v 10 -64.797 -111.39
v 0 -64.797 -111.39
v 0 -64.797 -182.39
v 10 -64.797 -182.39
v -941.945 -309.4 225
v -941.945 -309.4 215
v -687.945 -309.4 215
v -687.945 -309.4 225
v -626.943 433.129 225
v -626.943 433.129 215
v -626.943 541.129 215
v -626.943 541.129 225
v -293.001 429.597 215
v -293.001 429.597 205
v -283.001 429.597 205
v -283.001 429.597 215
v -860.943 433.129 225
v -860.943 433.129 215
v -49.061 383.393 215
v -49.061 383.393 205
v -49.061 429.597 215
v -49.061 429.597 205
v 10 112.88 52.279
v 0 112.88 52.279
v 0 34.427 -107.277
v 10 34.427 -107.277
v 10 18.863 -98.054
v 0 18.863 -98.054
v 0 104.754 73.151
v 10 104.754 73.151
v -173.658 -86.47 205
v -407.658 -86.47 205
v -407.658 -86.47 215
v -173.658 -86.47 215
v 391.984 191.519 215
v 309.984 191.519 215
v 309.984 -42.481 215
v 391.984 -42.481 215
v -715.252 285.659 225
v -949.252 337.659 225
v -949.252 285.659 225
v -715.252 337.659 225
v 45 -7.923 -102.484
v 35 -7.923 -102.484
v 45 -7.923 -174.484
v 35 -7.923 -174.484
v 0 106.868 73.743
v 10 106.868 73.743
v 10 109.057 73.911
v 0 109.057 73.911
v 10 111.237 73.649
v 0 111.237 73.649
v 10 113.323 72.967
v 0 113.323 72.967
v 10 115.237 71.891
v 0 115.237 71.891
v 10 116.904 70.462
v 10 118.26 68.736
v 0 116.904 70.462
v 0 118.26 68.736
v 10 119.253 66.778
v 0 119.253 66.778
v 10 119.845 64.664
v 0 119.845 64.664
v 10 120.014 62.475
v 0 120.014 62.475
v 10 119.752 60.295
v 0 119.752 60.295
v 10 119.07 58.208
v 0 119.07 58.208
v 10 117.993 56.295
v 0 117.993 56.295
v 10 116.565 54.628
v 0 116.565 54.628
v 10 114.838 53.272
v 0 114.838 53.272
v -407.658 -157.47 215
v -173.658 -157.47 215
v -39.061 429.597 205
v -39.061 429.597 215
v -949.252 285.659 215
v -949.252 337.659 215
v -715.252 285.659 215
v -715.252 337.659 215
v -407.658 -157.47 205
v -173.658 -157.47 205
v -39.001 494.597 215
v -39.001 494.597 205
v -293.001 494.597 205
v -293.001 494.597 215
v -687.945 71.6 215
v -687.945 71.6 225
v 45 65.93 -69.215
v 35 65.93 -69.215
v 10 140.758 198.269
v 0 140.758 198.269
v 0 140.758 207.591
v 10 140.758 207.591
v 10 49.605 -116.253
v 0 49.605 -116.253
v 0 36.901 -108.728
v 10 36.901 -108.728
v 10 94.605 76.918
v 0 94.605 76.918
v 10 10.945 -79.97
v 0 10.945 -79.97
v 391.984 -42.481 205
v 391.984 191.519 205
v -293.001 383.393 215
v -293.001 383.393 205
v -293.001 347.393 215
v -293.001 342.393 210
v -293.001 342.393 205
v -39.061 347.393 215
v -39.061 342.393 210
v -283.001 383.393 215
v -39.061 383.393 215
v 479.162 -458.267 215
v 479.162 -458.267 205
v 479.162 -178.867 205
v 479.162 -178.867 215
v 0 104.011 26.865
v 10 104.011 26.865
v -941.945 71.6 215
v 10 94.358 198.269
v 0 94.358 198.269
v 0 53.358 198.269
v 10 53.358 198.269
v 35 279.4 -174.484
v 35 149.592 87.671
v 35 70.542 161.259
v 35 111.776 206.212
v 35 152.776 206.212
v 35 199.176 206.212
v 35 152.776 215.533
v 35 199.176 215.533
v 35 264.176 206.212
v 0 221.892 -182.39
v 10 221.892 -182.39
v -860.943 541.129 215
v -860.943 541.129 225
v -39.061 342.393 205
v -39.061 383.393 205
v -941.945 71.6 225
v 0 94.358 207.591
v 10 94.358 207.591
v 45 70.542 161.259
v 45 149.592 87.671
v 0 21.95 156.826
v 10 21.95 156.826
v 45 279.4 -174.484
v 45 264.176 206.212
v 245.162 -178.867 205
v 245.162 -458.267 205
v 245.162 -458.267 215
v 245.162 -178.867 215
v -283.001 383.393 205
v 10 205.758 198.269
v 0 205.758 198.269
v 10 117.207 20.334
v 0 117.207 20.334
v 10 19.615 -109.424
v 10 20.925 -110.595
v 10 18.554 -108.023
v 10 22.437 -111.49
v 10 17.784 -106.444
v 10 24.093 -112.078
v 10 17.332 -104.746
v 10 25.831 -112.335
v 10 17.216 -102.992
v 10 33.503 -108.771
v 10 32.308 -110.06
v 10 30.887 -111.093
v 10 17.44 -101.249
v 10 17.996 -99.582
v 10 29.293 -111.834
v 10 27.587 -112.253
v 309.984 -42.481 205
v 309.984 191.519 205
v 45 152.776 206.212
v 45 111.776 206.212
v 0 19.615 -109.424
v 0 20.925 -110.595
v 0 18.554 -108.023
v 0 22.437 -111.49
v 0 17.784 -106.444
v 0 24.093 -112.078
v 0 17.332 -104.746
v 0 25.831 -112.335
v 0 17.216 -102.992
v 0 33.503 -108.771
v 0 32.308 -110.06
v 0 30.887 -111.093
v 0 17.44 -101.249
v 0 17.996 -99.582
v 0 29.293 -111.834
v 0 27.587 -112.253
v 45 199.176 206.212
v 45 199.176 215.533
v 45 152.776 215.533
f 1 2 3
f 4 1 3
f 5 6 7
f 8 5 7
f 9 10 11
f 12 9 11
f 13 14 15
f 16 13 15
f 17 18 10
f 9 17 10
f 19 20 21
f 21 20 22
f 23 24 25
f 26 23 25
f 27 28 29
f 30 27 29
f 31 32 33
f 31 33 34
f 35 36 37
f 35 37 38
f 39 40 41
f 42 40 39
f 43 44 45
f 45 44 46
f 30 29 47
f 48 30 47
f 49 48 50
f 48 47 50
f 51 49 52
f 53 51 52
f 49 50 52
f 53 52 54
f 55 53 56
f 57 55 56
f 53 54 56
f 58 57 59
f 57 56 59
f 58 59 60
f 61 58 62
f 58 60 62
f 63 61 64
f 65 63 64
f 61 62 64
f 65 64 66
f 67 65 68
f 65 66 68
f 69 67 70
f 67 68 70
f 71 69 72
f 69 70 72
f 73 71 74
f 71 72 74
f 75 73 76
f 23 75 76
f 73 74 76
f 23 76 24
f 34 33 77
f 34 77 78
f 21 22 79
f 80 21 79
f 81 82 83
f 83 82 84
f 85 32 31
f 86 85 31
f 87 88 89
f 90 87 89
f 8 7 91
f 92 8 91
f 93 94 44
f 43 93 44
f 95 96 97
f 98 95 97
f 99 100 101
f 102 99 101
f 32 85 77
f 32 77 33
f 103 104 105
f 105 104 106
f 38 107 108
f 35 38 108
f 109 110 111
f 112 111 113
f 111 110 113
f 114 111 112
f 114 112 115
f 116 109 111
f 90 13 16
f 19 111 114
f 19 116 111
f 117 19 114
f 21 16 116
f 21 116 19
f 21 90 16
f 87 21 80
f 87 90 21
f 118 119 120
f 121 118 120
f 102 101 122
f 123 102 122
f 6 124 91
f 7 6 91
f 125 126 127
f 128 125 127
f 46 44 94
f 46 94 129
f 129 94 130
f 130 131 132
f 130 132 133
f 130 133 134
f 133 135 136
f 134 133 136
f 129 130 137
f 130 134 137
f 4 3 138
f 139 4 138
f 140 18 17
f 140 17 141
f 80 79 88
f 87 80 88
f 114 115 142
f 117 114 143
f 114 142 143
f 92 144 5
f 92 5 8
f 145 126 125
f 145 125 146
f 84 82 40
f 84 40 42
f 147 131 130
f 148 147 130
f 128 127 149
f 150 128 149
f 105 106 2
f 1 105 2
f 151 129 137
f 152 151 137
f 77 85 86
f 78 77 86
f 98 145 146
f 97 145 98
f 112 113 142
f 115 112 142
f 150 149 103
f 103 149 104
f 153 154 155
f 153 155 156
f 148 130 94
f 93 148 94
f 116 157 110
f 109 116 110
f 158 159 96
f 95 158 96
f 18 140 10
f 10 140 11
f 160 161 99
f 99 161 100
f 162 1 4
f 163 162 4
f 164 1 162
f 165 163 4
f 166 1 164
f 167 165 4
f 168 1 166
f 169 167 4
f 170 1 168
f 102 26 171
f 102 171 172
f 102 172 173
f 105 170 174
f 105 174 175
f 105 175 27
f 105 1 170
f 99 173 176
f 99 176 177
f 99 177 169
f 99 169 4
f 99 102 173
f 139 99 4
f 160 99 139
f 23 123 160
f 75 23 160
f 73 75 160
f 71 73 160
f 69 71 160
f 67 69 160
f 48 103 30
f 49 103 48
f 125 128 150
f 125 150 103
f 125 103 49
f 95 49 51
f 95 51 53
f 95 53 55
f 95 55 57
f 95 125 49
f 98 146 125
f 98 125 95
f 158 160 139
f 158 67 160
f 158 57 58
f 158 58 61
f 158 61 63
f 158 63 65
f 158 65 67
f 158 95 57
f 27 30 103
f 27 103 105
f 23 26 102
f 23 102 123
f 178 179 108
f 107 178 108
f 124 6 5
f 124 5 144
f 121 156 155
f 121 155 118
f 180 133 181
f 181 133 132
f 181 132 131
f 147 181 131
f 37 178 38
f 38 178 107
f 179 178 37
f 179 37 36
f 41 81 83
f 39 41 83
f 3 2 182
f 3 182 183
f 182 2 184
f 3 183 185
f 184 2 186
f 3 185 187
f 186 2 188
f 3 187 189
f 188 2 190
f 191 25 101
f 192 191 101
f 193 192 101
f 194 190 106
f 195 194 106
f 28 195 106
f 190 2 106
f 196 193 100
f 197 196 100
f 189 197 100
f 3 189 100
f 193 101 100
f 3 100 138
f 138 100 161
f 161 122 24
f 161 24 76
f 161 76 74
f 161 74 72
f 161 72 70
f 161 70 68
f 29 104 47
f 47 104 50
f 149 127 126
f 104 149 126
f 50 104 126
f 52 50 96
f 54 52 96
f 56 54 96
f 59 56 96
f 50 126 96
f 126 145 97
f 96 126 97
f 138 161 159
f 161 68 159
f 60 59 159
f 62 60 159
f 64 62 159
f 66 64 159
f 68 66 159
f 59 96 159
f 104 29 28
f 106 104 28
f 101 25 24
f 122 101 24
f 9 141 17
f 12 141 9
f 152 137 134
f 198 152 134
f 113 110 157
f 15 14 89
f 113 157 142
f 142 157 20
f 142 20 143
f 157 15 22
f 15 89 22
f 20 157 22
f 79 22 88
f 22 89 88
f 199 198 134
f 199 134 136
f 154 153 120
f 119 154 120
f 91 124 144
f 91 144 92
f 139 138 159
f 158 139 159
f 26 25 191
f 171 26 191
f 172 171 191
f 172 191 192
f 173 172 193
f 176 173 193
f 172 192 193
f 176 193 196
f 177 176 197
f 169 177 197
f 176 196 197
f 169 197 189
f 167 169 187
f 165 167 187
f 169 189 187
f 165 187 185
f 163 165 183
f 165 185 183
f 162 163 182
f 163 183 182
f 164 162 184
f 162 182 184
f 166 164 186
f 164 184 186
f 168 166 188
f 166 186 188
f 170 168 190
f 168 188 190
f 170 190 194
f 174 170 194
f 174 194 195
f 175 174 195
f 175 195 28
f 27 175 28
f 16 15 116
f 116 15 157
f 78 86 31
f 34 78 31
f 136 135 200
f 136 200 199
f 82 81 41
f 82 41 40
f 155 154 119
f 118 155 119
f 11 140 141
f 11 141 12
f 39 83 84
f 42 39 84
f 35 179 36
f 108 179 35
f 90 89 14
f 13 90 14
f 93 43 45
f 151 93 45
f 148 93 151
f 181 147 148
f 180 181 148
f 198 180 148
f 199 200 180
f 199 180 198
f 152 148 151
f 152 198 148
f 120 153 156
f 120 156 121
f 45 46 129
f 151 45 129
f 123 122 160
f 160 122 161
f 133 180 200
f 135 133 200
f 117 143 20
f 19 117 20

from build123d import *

# Parameters (mm, degrees)
F0_W      = 46.4
F0_H      = 9.322
F1_DEPTH  = 10
F5_DEPTH  = 10
F7_SIZE   = 5
F9_W      = 46.4000000058
F9_H      = 9.3215752476
F10_DEPTH = 10
F11_W     = 254
F11_H     = 381
F12_DEPTH = 10
F13_W     = 234
F13_H     = 52
F14_DEPTH = 10
F15_W     = 234
F15_H     = 108
F16_DEPTH = 10
F17_W     = 82
F17_H     = 234
F18_DEPTH = 10
F19_W     = 234
F19_H     = 71
F20_DEPTH = 10
F21_W     = 234
F21_H     = 279.4
F22_DEPTH = 10


with BuildPart() as f1:
    # F0 (on Right) → F1 (new body)
    with BuildSketch(Plane.YZ):
        Polygon((-64.796539762, -182.3895969412), (-57.5082729275, -182.3895969412), (221.8917270725, -182.3895969412), (205.7584536639, 198.2686717056), (140.7584536639, 198.2686717056), (94.3584536639, 198.2686717056), (53.3584536639, 198.2686717056), (21.9498726075, 156.8259276359), (94.605094511, 76.9183639755), (10.9450170771, -79.9695942742), (-64.796539762, -111.3895969412), align=None)
        Polygon((49.6052874287, -116.2525428597), (36.9012057781, -108.7284162641), (104.0113260207, 26.8646163094), (117.2069395227, 20.3336081006), align=None, mode=Mode.SUBTRACT)
        with BuildLine():
            ThreePointArc((104.7540009022, 73.150858283), (119.2531366096, 66.7778584138), (112.8801367404, 52.2787227063))
            Line((112.8801367404, 52.2787227063), (34.4274975359, -107.2769835591))
            ThreePointArc((34.4274975359, -107.2769835591), (21.6595235328, -111.0791874475), (18.863433972, -98.0538353324))
            Line((18.863433972, -98.0538353324), (104.7540009022, 73.150858283))
        make_face(mode=Mode.SUBTRACT)
        with Locations((117.5584536639, 202.9296717056)):
            Rectangle(F0_W, F0_H)
    extrude(amount=F1_DEPTH)


with BuildPart() as f5:
    # F4 (on offset) → F5 (new body)
    with BuildSketch(Plane.XY.offset(205)):
        Polygon((-39.0006619062, 494.596632719), (-293.0006619062, 494.596632719), (-293.0006619062, 429.596632719), (-283.0006619062, 429.596632719), (-283.0006619062, 383.392881012), (-293.0006619062, 383.392881012), (-293.0006619062, 342.392881012), (-39.0612547696, 342.392881012), (-39.0612547696, 383.392881012), (-49.0612547696, 383.392881012), (-49.0612547696, 429.596632719), (-39.0612547696, 429.596632719), align=None)
    extrude(amount=F5_DEPTH)

    # F7
    f7_edges = [f5.edges().sort_by_distance(p)[0] for p in [
        (-166.030958, 342.392881, 215),
    ]]
    chamfer(f7_edges, length=F7_SIZE)


with BuildPart() as f10:
    # F9 (on offset) → F10 (new body)
    with BuildSketch(Plane.YZ.offset(35)):
        Polygon((149.5919942923, 87.671287306), (65.9295212644, -69.2153934763), (-7.923, -102.4840739864), (-7.923, -174.4840739864), (0, -174.4840739864), (279.4, -174.4840739864), (264.1758101478, 206.2116365796), (199.1758101478, 206.2116365797), (152.775810142, 206.2116365797), (111.775810142, 206.2116365648), (70.5419946621, 161.2586337622), align=None)
        with Locations((175.9758101449, 210.8724242035)):
            Rectangle(F9_W, F9_H)
    extrude(amount=F10_DEPTH)


with BuildPart() as f12:
    # F11 (on offset) → F12 (new body)
    with BuildSketch(Plane.XY.offset(215)):
        with Locations((-814.9448533747, -118.8999935985)):
            Rectangle(F11_W, F11_H)
    extrude(amount=F12_DEPTH)


with BuildPart() as f14:
    # F13 (on offset) → F14 (new body)
    with BuildSketch(Plane.XY.offset(215)):
        with Locations((-832.2524428368, 311.6594097933)):
            Rectangle(F13_W, F13_H)
    extrude(amount=F14_DEPTH)


with BuildPart() as f16:
    # F15 (on offset) → F16 (new body)
    with BuildSketch(Plane.XY.offset(215)):
        with Locations((-743.942886591, 487.1286771533)):
            Rectangle(F15_W, F15_H)
    extrude(amount=F16_DEPTH)


with BuildPart() as f18:
    # F17 (on offset) → F18 (new body)
    with BuildSketch(Plane.XY.offset(205)):
        with Locations((350.9838730097, 74.5187658328)):
            Rectangle(F17_W, F17_H)
    extrude(amount=F18_DEPTH)


with BuildPart() as f20:
    # F19 (on offset) → F20 (new body)
    with BuildSketch(Plane.XY.offset(205)):
        with Locations((-290.6577438116, -121.9697131045)):
            Rectangle(F19_W, F19_H)
    extrude(amount=F20_DEPTH)


with BuildPart() as f22:
    # F21 (on offset) → F22 (new body)
    with BuildSketch(Plane.XY.offset(205)):
        with Locations((362.1622659266, -318.5673205169)):
            Rectangle(F21_W, F21_H)
    extrude(amount=F22_DEPTH)


solid = Compound([f1.part, f5.part, f10.part, f12.part, f14.part, f16.part, f18.part, f20.part, f22.part])
